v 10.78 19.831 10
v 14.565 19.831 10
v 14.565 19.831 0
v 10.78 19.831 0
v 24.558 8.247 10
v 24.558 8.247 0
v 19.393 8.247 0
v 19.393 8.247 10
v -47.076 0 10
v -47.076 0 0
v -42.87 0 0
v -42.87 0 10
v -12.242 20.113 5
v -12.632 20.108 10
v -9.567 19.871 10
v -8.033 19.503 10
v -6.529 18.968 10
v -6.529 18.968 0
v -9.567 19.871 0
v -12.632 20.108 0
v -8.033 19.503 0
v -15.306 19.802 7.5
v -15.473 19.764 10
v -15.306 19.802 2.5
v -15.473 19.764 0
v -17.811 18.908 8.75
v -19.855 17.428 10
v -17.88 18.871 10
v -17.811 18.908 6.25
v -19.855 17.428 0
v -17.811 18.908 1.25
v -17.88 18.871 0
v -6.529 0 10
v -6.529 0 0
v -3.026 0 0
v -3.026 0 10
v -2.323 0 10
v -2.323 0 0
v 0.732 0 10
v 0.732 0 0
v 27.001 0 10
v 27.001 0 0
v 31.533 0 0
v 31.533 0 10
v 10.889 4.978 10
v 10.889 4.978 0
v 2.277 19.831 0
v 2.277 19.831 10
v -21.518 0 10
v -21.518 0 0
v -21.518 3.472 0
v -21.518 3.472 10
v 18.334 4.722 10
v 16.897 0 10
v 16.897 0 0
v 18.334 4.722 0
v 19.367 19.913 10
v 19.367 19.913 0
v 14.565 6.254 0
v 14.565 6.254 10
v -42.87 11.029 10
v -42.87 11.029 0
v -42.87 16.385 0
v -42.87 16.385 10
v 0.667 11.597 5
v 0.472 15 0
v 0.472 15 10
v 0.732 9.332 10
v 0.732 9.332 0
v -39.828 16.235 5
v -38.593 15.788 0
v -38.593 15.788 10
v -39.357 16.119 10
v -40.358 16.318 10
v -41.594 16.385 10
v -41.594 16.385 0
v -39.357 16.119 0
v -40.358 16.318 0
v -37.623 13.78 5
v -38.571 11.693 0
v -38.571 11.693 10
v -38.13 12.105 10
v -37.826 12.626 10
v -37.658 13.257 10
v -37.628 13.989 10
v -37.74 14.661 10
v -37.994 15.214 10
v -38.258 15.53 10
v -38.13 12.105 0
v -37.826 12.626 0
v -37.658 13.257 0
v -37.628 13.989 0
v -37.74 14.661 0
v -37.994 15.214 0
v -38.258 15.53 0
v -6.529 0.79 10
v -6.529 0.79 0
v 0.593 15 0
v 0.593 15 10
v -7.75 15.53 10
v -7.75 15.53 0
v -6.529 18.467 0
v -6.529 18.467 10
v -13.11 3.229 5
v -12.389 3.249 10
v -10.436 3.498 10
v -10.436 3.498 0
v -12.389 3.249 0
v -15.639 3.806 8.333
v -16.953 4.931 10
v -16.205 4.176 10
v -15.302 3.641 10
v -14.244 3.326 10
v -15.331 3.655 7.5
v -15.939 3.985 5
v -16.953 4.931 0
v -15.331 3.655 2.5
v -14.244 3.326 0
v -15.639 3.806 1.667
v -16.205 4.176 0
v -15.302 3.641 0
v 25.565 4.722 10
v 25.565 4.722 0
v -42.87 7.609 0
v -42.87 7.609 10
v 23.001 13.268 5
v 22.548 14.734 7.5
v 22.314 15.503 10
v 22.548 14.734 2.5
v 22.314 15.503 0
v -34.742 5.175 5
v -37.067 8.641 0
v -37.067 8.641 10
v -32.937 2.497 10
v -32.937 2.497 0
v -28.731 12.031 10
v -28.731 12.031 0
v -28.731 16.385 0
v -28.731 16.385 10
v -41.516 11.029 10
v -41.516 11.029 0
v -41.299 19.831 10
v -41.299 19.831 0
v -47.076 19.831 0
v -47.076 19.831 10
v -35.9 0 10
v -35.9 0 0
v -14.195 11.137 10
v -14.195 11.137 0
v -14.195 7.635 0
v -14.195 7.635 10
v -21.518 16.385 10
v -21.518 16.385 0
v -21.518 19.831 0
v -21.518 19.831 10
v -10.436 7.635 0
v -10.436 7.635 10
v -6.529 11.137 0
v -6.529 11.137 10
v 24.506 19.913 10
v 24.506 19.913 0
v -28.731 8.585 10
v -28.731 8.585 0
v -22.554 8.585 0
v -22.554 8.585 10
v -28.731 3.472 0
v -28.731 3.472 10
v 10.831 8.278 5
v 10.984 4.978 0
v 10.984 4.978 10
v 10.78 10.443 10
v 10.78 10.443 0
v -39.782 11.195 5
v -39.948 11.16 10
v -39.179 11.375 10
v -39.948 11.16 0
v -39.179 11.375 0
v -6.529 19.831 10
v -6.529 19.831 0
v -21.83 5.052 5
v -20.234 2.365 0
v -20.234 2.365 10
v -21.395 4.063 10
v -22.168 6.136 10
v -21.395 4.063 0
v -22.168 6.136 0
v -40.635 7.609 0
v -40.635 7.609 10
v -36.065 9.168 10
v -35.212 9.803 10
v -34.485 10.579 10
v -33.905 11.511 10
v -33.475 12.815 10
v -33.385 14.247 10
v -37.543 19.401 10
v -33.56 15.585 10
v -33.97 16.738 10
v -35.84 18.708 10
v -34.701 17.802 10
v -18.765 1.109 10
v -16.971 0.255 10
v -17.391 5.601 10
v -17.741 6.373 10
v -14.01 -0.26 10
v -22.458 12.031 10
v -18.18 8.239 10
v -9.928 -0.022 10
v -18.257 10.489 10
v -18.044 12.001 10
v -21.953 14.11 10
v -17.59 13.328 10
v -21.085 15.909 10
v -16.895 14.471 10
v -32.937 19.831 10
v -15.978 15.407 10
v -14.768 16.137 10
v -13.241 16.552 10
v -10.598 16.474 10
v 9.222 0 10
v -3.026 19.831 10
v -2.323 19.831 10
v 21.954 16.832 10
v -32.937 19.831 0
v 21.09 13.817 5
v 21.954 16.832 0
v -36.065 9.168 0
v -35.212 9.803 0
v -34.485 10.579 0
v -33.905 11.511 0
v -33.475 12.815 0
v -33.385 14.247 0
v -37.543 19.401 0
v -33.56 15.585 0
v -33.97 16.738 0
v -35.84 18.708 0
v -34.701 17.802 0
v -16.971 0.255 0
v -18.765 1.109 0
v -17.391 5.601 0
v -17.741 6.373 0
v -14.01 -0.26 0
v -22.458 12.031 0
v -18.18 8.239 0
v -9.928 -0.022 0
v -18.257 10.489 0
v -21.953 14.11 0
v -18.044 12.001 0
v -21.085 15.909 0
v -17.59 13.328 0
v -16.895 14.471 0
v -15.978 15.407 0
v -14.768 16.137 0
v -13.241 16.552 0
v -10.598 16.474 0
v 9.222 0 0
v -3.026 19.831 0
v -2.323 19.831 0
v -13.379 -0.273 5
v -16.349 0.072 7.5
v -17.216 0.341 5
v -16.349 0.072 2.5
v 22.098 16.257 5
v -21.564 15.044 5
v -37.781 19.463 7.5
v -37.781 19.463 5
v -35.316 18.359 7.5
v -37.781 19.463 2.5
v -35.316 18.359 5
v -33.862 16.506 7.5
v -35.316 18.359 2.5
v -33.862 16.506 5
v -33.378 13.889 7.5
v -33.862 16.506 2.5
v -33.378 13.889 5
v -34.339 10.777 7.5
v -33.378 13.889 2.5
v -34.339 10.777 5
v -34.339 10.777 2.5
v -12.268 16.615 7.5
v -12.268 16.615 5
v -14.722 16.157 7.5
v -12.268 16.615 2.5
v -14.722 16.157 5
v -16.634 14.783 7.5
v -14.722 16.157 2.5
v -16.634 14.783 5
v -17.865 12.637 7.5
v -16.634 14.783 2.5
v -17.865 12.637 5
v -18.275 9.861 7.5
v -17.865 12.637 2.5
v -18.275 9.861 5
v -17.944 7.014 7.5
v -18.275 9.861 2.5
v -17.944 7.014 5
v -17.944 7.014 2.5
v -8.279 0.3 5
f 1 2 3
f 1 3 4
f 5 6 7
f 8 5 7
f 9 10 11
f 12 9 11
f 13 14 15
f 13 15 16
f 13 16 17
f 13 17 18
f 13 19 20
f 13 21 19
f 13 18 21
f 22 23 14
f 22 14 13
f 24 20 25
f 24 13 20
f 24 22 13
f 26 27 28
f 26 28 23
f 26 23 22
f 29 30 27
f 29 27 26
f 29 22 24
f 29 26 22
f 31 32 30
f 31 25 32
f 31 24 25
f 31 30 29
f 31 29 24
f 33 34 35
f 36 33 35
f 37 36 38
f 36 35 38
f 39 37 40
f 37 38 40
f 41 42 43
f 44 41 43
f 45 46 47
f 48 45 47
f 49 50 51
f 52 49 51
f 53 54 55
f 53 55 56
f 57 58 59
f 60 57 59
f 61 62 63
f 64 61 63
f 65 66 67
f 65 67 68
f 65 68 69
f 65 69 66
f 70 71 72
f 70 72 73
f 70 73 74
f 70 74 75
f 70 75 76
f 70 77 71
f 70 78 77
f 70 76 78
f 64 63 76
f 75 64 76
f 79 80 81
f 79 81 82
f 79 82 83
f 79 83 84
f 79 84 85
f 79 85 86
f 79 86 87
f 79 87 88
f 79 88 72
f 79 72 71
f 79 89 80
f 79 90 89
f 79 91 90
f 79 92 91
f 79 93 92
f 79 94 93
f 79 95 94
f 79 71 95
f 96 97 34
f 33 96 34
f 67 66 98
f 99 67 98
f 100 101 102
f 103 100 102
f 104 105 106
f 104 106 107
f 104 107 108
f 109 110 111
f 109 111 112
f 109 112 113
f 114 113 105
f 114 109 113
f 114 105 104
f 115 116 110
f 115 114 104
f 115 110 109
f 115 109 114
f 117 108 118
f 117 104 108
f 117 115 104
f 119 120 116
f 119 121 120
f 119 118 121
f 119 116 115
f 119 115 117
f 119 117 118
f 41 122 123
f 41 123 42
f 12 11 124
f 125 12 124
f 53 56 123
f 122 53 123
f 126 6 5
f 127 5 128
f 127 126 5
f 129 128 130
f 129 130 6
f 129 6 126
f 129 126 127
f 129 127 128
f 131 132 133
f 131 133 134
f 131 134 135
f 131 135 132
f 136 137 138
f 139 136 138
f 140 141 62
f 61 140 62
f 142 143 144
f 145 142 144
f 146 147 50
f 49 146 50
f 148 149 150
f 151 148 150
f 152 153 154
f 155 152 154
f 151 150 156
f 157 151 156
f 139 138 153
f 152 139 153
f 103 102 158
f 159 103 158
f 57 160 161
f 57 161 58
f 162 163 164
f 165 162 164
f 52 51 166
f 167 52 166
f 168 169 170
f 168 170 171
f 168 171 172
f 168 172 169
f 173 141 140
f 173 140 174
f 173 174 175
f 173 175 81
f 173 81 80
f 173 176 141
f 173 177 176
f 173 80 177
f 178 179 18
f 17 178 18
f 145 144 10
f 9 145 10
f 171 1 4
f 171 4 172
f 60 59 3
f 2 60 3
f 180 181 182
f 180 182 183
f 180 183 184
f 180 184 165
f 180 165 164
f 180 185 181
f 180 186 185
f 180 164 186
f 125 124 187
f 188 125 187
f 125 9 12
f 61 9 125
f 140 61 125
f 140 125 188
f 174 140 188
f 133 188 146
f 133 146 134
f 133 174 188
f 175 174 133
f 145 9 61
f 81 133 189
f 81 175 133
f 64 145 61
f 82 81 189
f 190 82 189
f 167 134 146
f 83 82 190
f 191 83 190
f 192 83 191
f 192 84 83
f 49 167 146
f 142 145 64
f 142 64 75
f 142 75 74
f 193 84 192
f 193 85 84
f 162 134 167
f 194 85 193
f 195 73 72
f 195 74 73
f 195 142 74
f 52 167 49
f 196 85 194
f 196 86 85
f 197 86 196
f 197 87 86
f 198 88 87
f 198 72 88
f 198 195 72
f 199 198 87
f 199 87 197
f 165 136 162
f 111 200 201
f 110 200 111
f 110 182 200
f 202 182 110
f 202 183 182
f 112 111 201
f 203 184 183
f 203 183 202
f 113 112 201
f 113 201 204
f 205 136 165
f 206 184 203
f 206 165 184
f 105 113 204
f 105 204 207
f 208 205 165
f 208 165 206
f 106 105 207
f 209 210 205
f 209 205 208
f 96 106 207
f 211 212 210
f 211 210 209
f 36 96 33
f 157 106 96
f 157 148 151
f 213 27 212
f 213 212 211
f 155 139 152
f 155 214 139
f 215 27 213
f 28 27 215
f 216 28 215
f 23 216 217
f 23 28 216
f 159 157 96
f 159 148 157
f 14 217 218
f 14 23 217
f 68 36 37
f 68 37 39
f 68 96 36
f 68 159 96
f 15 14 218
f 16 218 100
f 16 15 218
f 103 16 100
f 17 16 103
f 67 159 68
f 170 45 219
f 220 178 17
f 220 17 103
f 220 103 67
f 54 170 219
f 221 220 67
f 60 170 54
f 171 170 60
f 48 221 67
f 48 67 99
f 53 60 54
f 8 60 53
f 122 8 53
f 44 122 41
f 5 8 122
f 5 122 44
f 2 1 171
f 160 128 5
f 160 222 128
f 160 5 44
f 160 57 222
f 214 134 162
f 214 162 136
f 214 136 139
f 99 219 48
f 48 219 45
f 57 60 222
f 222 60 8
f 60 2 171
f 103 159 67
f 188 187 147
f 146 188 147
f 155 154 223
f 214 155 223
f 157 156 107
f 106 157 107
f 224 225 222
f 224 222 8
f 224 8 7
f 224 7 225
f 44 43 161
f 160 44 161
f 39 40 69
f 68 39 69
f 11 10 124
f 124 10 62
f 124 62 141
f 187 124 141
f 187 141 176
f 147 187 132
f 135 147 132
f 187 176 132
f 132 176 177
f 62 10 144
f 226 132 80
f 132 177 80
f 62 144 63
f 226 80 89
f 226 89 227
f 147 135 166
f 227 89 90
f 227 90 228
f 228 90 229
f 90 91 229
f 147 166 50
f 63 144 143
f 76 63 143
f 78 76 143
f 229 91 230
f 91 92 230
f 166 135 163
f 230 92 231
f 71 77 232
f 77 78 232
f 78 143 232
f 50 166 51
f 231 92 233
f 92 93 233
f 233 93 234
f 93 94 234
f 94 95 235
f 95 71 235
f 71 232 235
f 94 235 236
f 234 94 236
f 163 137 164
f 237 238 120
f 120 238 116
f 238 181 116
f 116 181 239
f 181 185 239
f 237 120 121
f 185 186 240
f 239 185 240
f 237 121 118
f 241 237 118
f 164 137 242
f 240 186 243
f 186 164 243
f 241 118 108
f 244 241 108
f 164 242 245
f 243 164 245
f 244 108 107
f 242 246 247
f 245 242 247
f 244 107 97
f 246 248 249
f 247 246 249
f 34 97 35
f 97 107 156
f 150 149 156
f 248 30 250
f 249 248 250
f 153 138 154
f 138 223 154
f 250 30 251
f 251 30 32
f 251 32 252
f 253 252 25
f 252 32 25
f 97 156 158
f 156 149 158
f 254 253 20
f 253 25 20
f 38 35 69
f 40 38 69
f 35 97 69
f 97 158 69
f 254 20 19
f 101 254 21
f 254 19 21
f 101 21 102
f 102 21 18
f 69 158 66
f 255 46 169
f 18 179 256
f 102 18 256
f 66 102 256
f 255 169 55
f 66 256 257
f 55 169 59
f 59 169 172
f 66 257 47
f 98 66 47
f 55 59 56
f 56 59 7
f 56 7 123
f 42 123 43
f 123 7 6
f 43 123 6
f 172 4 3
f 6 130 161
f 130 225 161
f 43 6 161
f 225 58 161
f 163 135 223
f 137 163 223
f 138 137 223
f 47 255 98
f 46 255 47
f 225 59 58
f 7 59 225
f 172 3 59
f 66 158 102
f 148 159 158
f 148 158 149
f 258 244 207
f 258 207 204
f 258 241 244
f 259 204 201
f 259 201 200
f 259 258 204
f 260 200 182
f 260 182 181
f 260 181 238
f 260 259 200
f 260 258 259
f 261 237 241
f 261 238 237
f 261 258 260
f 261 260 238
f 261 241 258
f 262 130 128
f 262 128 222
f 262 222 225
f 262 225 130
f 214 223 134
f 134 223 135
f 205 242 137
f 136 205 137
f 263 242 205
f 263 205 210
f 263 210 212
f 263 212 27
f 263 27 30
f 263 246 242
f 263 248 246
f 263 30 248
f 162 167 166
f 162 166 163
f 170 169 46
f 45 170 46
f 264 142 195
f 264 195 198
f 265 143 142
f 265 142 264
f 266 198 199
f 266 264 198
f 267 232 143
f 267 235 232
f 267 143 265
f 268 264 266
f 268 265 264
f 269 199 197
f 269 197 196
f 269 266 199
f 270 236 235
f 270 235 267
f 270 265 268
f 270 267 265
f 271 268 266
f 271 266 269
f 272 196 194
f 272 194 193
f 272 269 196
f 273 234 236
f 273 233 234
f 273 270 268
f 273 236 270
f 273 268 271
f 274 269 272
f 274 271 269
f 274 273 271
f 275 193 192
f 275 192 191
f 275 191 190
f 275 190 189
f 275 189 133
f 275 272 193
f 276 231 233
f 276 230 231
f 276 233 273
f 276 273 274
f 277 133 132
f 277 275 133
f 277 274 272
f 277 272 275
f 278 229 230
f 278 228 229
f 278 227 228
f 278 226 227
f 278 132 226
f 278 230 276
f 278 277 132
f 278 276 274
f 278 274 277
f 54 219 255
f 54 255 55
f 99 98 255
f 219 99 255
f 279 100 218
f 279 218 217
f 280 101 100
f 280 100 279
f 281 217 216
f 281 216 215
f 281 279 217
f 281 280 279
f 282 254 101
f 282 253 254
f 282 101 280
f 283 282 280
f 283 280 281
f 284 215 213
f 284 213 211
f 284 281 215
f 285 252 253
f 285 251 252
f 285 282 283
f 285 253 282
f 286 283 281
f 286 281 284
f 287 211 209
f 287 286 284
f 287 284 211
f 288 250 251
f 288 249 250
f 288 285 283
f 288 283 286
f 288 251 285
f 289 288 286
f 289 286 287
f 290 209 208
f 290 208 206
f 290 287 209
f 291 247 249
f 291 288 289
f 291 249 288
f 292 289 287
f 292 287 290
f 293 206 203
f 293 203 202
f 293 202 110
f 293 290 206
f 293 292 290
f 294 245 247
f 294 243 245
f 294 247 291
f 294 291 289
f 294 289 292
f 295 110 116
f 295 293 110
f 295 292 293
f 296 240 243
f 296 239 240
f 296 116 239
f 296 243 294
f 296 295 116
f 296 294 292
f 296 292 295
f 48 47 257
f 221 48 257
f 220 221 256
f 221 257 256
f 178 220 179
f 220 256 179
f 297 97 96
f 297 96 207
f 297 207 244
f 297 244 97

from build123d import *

# Parameters (mm, degrees)
F0_W     = 0.703125
F0_H     = 19.8307291667
F1_DEPTH = 10


with BuildPart() as f1:
    # F0 (on Top) → F1 (new body)
    with BuildSketch(Plane.XY):
        with BuildLine():
            Line((-42.8701766354, 0), (-42.8701766354, 7.6085069444))
            Line((-42.8701766354, 7.6085069444), (-40.6349335799, 7.6085069444))
            Line((-40.6349335799, 7.6085069444), (-35.8996905243, 0))
            Line((-35.8996905243, 0), (-32.9370169132, 0))
            Line((-32.9370169132, 0), (-32.9370169132, 2.4971721643))
            add(Edge.make_bspline(
                [(-37.0672252465, 8.6414930556), (-34.4813623275, 4.7802384448), (-32.9370169132, 2.4971721643)],
                knots=[0, 0, 0, 0.5773089308, 0.5773089308, 0.5773089308], degree=2))
            add(Edge.make_bspline(
                [(-34.3393606632, 10.7769097222), (-35.300732191, 9.4140625), (-37.0672252465, 8.6414930556)],
                knots=[0, 0, 0, 1, 1, 1], degree=2))
            add(Edge.make_bspline(
                [(-33.3779891354, 13.8888888889), (-33.3779891354, 12.1397569444), (-34.3393606632, 10.7769097222)],
                knots=[0, 0, 0, 1, 1, 1], degree=2))
            add(Edge.make_bspline(
                [(-35.3159231632, 18.359375), (-33.3779891354, 16.8880208333), (-33.3779891354, 13.8888888889)],
                knots=[0, 0, 0, 1, 1, 1], degree=2))
            add(Edge.make_bspline(
                [(-41.2989960799, 19.8307291667), (-37.253857191, 19.8307291667), (-35.3159231632, 18.359375)],
                knots=[0, 0, 0, 1, 1, 1], degree=2))
            Line((-41.2989960799, 19.8307291667), (-47.0759058021, 19.8307291667))
            Line((-47.0759058021, 19.8307291667), (-47.0759058021, 0))
            Line((-47.0759058021, 0), (-42.8701766354, 0))
        make_face()
        with BuildLine():
            Line((-41.5160099688, 11.0286458333), (-42.8701766354, 11.0286458333))
            Line((-42.8701766354, 11.0286458333), (-42.8701766354, 16.3845486111))
            Line((-42.8701766354, 16.3845486111), (-41.5941349688, 16.3845486111))
            add(Edge.make_bspline(
                [(-38.5928328854, 15.7877604167), (-39.5628849688, 16.3845486111), (-41.5941349688, 16.3845486111)],
                knots=[0, 0, 0, 1, 1, 1], degree=2))
            add(Edge.make_bspline(
                [(-37.6227808021, 13.7803819444), (-37.6227808021, 15.1909722222), (-38.5928328854, 15.7877604167)],
                knots=[0, 0, 0, 1, 1, 1], degree=2))
            add(Edge.make_bspline(
                [(-38.5711314965, 11.6927083333), (-37.6227808021, 12.3567708333), (-37.6227808021, 13.7803819444)],
                knots=[0, 0, 0, 1, 1, 1], degree=2))
            add(Edge.make_bspline(
                [(-41.5160099688, 11.0286458333), (-39.519482191, 11.0286458333), (-38.5711314965, 11.6927083333)],
                knots=[0, 0, 0, 1, 1, 1], degree=2))
        make_face(mode=Mode.SUBTRACT)
        with BuildLine():
            Line((-32.9370169132, 2.4971721643), (-32.9370169132, 0))
            Line((-32.9370169132, 0), (-31.2338919132, 0))
            add(Edge.make_bspline(
                [(-32.9370169132, 2.4971721643), (-31.8062860695, 0.8255684946), (-31.2338919132, 0)],
                knots=[0.5773089308, 0.5773089308, 0.5773089308, 1, 1, 1], degree=2))
        make_face()
        with BuildLine():
            add(Edge.make_bspline(
                [(-32.9370169132, 2.4971721643), (-31.8062860695, 0.8255684946), (-31.2338919132, 0)],
                knots=[0.5773089308, 0.5773089308, 0.5773089308, 1, 1, 1], degree=2))
            Line((-31.2338919132, 0), (-21.5177460799, 0))
            Line((-21.5177460799, 0), (-21.5177460799, 3.4722222222))
            Line((-21.5177460799, 3.4722222222), (-28.7312877465, 3.4722222222))
            Line((-28.7312877465, 3.4722222222), (-28.7312877465, 8.5850694444))
            Line((-28.7312877465, 8.5850694444), (-22.5540500408, 8.5850694444))
            add(Edge.make_bspline(
                [(-22.5540500408, 8.5850694444), (-22.6019474688, 9.2410546886), (-22.6019474688, 9.9435763889)],
                knots=[0.8577671355, 0.8577671355, 0.8577671355, 1, 1, 1], degree=2))
            add(Edge.make_bspline(
                [(-22.6019474688, 9.9435763889), (-22.6019474688, 11.042896907), (-22.4578605353, 12.03125)],
                knots=[0, 0, 0, 0.2290085419, 0.2290085419, 0.2290085419], degree=2))
            Line((-22.4578605353, 12.03125), (-28.7312877465, 12.03125))
            Line((-28.7312877465, 12.03125), (-28.7312877465, 16.3845486111))
            Line((-28.7312877465, 16.3845486111), (-21.5177460799, 16.3845486111))
            Line((-21.5177460799, 16.3845486111), (-21.5177460799, 19.8307291667))
            Line((-21.5177460799, 19.8307291667), (-32.9370169132, 19.8307291667))
            Line((-32.9370169132, 19.8307291667), (-32.9370169132, 2.4971721643))
        make_face()
        with BuildLine():
            add(Edge.make_bspline(
                [(-22.5540500408, 8.5850694444), (-22.6019474688, 9.2410546886), (-22.6019474688, 9.9435763889)],
                knots=[0.8577671355, 0.8577671355, 0.8577671355, 1, 1, 1], degree=2))
            Line((-22.5540500408, 8.5850694444), (-22.0168780243, 8.5850694444))
            Line((-22.0168780243, 8.5850694444), (-22.0168780243, 12.03125))
            Line((-22.0168780243, 12.03125), (-22.4578605353, 12.03125))
            add(Edge.make_bspline(
                [(-22.6019474688, 9.9435763889), (-22.6019474688, 11.042896907), (-22.4578605353, 12.03125)],
                knots=[0, 0, 0, 0.2290085419, 0.2290085419, 0.2290085419], degree=2))
        make_face()
        with BuildLine():
            Line((-22.0168780243, 8.5850694444), (-22.5540500408, 8.5850694444))
            add(Edge.make_bspline(
                [(-20.234325941, 2.3654513889), (-22.2651938769, 4.6290035521), (-22.5540500408, 8.5850694444)],
                knots=[0, 0, 0, 0.8577671355, 0.8577671355, 0.8577671355], degree=2))
            add(Edge.make_bspline(
                [(-13.378857191, -0.2734375), (-17.8667044132, -0.2734375), (-20.234325941, 2.3654513889)],
                knots=[0, 0, 0, 1, 1, 1], degree=2))
            add(Edge.make_bspline(
                [(-9.9283363577, -0.0217013889), (-11.6167044132, -0.2734375), (-13.378857191, -0.2734375)],
                knots=[0, 0, 0, 1, 1, 1], degree=2))
            add(Edge.make_bspline(
                [(-6.5290308021, 0.7895569413), (-8.3298372028, 0.216635246), (-9.9283363577, -0.0217013889)],
                knots=[0.0532282641, 0.0532282641, 0.0532282641, 1, 1, 1], degree=2))
            Line((-6.5290308021, 0.7895569413), (-6.5290308021, 11.1371527778))
            Line((-6.5290308021, 11.1371527778), (-14.1948294132, 11.1371527778))
            Line((-14.1948294132, 11.1371527778), (-14.1948294132, 7.6345486111))
            Line((-14.1948294132, 7.6345486111), (-10.4361488577, 7.6345486111))
            Line((-10.4361488577, 7.6345486111), (-10.4361488577, 3.4982638889))
            add(Edge.make_bspline(
                [(-13.1097599688, 3.2291666667), (-11.7903155243, 3.2291666667), (-10.4361488577, 3.4982638889)],
                knots=[0, 0, 0, 1, 1, 1], degree=2))
            add(Edge.make_bspline(
                [(-16.953075941, 4.9305555556), (-15.6314613577, 3.2291666667), (-13.1097599688, 3.2291666667)],
                knots=[0, 0, 0, 1, 1, 1], degree=2))
            add(Edge.make_bspline(
                [(-18.2746905243, 9.8611111111), (-18.2746905243, 6.6319444444), (-16.953075941, 4.9305555556)],
                knots=[0, 0, 0, 1, 1, 1], degree=2))
            add(Edge.make_bspline(
                [(-16.6340655243, 14.7829861111), (-18.2746905243, 12.9513888889), (-18.2746905243, 9.8611111111)],
                knots=[0, 0, 0, 1, 1, 1], degree=2))
            add(Edge.make_bspline(
                [(-12.2677460799, 16.6145833333), (-14.9934405243, 16.6145833333), (-16.6340655243, 14.7829861111)],
                knots=[0, 0, 0, 1, 1, 1], degree=2))
            add(Edge.make_bspline(
                [(-7.7495169132, 15.5295138889), (-9.9196558021, 16.6145833333), (-12.2677460799, 16.6145833333)],
                knots=[0, 0, 0, 1, 1, 1], degree=2))
            Line((-7.7495169132, 15.5295138889), (-6.5290308021, 18.4670192805))
            Line((-6.5290308021, 18.4670192805), (-6.5290308021, 18.9681518024))
            add(Edge.make_bspline(
                [(-12.2417044132, 20.1128472222), (-9.2814895535, 20.1128472222), (-6.5290308021, 18.9681518024)],
                knots=[0, 0, 0, 0.9687975904, 0.9687975904, 0.9687975904], degree=2))
            add(Edge.make_bspline(
                [(-19.8545516354, 17.4283854167), (-17.1071558021, 20.1128472222), (-12.2417044132, 20.1128472222)],
                knots=[0, 0, 0, 1, 1, 1], degree=2))
            add(Edge.make_bspline(
                [(-22.4578605353, 12.03125), (-21.9727703549, 15.358688295), (-19.8545516354, 17.4283854167)],
                knots=[0.2290085419, 0.2290085419, 0.2290085419, 1, 1, 1], degree=2))
            Line((-22.4578605353, 12.03125), (-22.0168780243, 12.03125))
            Line((-22.0168780243, 12.03125), (-22.0168780243, 8.5850694444))
        make_face()
        with BuildLine():
            Line((-6.5290308021, 11.1371527778), (-6.5290308021, 0.7895569413))
            add(Edge.make_bspline(
                [(-6.3259058021, 0.8550347222), (-6.4277880263, 0.8217670572), (-6.5290308021, 0.7895569413)],
                knots=[0, 0, 0, 0.0532282641, 0.0532282641, 0.0532282641], degree=2))
            Line((-6.3259058021, 0.8550347222), (-6.3259058021, 11.1371527778))
            Line((-6.3259058021, 11.1371527778), (-6.5290308021, 11.1371527778))
        make_face()
        with BuildLine():
            add(Edge.make_bspline(
                [(-6.3259058021, 0.8550347222), (-6.4277880263, 0.8217670572), (-6.5290308021, 0.7895569413)],
                knots=[0, 0, 0, 0.0532282641, 0.0532282641, 0.0532282641], degree=2))
            Line((-6.5290308021, 0.7895569413), (-6.5290308021, 0))
            Line((-6.5290308021, 0), (-3.0264266354, 0))
            Line((-3.0264266354, 0), (-3.0264266354, 19.8307291667))
            Line((-3.0264266354, 19.8307291667), (-6.5290308021, 19.8307291667))
            Line((-6.5290308021, 19.8307291667), (-6.5290308021, 18.9681518024))
            add(Edge.make_bspline(
                [(-6.5290308021, 18.9681518024), (-6.4403813813, 18.9312841887), (-6.3519474688, 18.8932291667)],
                knots=[0.9687975904, 0.9687975904, 0.9687975904, 1, 1, 1], degree=2))
            Line((-6.3519474688, 18.8932291667), (-6.5290308021, 18.4670192805))
            Line((-6.5290308021, 18.4670192805), (-6.5290308021, 11.1371527778))
            Line((-6.5290308021, 11.1371527778), (-6.3259058021, 11.1371527778))
            Line((-6.3259058021, 11.1371527778), (-6.3259058021, 0.8550347222))
        make_face()
        with BuildLine():
            add(Edge.make_bspline(
                [(-6.5290308021, 18.9681518024), (-6.4403813813, 18.9312841887), (-6.3519474688, 18.8932291667)],
                knots=[0.9687975904, 0.9687975904, 0.9687975904, 1, 1, 1], degree=2))
            Line((-6.5290308021, 18.9681518024), (-6.5290308021, 18.4670192805))
            Line((-6.5290308021, 18.4670192805), (-6.3519474688, 18.8932291667))
        make_face()
        with Locations((-2.6748641354, 9.9153645833)):
            Rectangle(F0_W, F0_H)
        with BuildLine():
            Line((-2.3233016354, 19.8307291667), (-2.3233016354, 0))
            Line((-2.3233016354, 0), (0.7322539201, 0))
            Line((0.7322539201, 0), (0.7322539201, 9.3315972222))
            add(Edge.make_bspline(
                [(0.4718372535, 15), (0.7322539201, 11.0286458333), (0.7322539201, 9.3315972222)],
                knots=[0, 0, 0, 1, 1, 1], degree=2))
            Line((0.4718372535, 15), (0.5933650312, 15))
            Line((0.5933650312, 15), (9.2218372535, 0))
            Line((9.2218372535, 0), (12.3659344757, 0))
            Line((12.3659344757, 0), (14.5647191979, 6.2541998175))
            Line((14.5647191979, 6.2541998175), (14.5647191979, 19.8307291667))
            Line((14.5647191979, 19.8307291667), (10.7799969757, 19.8307291667))
            Line((10.7799969757, 19.8307291667), (10.7799969757, 10.4427083333))
            add(Edge.make_bspline(
                [(10.9839900312, 4.9782986111), (10.7799969757, 8.8454861111), (10.7799969757, 10.4427083333)],
                knots=[0, 0, 0, 1, 1, 1], degree=2))
            Line((10.9839900312, 4.9782986111), (10.8885039201, 4.9782986111))
            Line((10.8885039201, 4.9782986111), (2.277392809, 19.8307291667))
            Line((2.277392809, 19.8307291667), (-2.3233016354, 19.8307291667))
        make_face()
        Polygon((14.5647191979, 6.2541998175), (12.3659344757, 0), (14.5647191979, 0), align=None)
        Polygon((14.5647191979, 6.2541998175), (14.5647191979, 0), (16.8971844757, 0), (18.3338164201, 4.7222222222), (25.5647191979, 4.7222222222), (27.0013511423, 0), (31.5326011423, 0), (24.5056914201, 19.9131944444), (19.3668025312, 19.9131944444), align=None)
        with BuildLine():
            add(Edge.make_bspline(
                [(24.5577747535, 8.2465277778), (22.5655872535, 14.6614583333), (22.3138511423, 15.5034722222)],
                knots=[0, 0, 0, 1, 1, 1], degree=2))
            Line((24.5577747535, 8.2465277778), (19.3928441979, 8.2465277778))
            add(Edge.make_bspline(
                [(21.9536080868, 16.8315972222), (21.5065594757, 15.0954861111), (19.3928441979, 8.2465277778)],
                knots=[0, 0, 0, 1, 1, 1], degree=2))
            add(Edge.make_bspline(
                [(22.3138511423, 15.5034722222), (22.0621150312, 16.3454861111), (21.9536080868, 16.8315972222)],
                knots=[0, 0, 0, 1, 1, 1], degree=2))
        make_face(mode=Mode.SUBTRACT)
    extrude(amount=F1_DEPTH)


solid = f1.part
